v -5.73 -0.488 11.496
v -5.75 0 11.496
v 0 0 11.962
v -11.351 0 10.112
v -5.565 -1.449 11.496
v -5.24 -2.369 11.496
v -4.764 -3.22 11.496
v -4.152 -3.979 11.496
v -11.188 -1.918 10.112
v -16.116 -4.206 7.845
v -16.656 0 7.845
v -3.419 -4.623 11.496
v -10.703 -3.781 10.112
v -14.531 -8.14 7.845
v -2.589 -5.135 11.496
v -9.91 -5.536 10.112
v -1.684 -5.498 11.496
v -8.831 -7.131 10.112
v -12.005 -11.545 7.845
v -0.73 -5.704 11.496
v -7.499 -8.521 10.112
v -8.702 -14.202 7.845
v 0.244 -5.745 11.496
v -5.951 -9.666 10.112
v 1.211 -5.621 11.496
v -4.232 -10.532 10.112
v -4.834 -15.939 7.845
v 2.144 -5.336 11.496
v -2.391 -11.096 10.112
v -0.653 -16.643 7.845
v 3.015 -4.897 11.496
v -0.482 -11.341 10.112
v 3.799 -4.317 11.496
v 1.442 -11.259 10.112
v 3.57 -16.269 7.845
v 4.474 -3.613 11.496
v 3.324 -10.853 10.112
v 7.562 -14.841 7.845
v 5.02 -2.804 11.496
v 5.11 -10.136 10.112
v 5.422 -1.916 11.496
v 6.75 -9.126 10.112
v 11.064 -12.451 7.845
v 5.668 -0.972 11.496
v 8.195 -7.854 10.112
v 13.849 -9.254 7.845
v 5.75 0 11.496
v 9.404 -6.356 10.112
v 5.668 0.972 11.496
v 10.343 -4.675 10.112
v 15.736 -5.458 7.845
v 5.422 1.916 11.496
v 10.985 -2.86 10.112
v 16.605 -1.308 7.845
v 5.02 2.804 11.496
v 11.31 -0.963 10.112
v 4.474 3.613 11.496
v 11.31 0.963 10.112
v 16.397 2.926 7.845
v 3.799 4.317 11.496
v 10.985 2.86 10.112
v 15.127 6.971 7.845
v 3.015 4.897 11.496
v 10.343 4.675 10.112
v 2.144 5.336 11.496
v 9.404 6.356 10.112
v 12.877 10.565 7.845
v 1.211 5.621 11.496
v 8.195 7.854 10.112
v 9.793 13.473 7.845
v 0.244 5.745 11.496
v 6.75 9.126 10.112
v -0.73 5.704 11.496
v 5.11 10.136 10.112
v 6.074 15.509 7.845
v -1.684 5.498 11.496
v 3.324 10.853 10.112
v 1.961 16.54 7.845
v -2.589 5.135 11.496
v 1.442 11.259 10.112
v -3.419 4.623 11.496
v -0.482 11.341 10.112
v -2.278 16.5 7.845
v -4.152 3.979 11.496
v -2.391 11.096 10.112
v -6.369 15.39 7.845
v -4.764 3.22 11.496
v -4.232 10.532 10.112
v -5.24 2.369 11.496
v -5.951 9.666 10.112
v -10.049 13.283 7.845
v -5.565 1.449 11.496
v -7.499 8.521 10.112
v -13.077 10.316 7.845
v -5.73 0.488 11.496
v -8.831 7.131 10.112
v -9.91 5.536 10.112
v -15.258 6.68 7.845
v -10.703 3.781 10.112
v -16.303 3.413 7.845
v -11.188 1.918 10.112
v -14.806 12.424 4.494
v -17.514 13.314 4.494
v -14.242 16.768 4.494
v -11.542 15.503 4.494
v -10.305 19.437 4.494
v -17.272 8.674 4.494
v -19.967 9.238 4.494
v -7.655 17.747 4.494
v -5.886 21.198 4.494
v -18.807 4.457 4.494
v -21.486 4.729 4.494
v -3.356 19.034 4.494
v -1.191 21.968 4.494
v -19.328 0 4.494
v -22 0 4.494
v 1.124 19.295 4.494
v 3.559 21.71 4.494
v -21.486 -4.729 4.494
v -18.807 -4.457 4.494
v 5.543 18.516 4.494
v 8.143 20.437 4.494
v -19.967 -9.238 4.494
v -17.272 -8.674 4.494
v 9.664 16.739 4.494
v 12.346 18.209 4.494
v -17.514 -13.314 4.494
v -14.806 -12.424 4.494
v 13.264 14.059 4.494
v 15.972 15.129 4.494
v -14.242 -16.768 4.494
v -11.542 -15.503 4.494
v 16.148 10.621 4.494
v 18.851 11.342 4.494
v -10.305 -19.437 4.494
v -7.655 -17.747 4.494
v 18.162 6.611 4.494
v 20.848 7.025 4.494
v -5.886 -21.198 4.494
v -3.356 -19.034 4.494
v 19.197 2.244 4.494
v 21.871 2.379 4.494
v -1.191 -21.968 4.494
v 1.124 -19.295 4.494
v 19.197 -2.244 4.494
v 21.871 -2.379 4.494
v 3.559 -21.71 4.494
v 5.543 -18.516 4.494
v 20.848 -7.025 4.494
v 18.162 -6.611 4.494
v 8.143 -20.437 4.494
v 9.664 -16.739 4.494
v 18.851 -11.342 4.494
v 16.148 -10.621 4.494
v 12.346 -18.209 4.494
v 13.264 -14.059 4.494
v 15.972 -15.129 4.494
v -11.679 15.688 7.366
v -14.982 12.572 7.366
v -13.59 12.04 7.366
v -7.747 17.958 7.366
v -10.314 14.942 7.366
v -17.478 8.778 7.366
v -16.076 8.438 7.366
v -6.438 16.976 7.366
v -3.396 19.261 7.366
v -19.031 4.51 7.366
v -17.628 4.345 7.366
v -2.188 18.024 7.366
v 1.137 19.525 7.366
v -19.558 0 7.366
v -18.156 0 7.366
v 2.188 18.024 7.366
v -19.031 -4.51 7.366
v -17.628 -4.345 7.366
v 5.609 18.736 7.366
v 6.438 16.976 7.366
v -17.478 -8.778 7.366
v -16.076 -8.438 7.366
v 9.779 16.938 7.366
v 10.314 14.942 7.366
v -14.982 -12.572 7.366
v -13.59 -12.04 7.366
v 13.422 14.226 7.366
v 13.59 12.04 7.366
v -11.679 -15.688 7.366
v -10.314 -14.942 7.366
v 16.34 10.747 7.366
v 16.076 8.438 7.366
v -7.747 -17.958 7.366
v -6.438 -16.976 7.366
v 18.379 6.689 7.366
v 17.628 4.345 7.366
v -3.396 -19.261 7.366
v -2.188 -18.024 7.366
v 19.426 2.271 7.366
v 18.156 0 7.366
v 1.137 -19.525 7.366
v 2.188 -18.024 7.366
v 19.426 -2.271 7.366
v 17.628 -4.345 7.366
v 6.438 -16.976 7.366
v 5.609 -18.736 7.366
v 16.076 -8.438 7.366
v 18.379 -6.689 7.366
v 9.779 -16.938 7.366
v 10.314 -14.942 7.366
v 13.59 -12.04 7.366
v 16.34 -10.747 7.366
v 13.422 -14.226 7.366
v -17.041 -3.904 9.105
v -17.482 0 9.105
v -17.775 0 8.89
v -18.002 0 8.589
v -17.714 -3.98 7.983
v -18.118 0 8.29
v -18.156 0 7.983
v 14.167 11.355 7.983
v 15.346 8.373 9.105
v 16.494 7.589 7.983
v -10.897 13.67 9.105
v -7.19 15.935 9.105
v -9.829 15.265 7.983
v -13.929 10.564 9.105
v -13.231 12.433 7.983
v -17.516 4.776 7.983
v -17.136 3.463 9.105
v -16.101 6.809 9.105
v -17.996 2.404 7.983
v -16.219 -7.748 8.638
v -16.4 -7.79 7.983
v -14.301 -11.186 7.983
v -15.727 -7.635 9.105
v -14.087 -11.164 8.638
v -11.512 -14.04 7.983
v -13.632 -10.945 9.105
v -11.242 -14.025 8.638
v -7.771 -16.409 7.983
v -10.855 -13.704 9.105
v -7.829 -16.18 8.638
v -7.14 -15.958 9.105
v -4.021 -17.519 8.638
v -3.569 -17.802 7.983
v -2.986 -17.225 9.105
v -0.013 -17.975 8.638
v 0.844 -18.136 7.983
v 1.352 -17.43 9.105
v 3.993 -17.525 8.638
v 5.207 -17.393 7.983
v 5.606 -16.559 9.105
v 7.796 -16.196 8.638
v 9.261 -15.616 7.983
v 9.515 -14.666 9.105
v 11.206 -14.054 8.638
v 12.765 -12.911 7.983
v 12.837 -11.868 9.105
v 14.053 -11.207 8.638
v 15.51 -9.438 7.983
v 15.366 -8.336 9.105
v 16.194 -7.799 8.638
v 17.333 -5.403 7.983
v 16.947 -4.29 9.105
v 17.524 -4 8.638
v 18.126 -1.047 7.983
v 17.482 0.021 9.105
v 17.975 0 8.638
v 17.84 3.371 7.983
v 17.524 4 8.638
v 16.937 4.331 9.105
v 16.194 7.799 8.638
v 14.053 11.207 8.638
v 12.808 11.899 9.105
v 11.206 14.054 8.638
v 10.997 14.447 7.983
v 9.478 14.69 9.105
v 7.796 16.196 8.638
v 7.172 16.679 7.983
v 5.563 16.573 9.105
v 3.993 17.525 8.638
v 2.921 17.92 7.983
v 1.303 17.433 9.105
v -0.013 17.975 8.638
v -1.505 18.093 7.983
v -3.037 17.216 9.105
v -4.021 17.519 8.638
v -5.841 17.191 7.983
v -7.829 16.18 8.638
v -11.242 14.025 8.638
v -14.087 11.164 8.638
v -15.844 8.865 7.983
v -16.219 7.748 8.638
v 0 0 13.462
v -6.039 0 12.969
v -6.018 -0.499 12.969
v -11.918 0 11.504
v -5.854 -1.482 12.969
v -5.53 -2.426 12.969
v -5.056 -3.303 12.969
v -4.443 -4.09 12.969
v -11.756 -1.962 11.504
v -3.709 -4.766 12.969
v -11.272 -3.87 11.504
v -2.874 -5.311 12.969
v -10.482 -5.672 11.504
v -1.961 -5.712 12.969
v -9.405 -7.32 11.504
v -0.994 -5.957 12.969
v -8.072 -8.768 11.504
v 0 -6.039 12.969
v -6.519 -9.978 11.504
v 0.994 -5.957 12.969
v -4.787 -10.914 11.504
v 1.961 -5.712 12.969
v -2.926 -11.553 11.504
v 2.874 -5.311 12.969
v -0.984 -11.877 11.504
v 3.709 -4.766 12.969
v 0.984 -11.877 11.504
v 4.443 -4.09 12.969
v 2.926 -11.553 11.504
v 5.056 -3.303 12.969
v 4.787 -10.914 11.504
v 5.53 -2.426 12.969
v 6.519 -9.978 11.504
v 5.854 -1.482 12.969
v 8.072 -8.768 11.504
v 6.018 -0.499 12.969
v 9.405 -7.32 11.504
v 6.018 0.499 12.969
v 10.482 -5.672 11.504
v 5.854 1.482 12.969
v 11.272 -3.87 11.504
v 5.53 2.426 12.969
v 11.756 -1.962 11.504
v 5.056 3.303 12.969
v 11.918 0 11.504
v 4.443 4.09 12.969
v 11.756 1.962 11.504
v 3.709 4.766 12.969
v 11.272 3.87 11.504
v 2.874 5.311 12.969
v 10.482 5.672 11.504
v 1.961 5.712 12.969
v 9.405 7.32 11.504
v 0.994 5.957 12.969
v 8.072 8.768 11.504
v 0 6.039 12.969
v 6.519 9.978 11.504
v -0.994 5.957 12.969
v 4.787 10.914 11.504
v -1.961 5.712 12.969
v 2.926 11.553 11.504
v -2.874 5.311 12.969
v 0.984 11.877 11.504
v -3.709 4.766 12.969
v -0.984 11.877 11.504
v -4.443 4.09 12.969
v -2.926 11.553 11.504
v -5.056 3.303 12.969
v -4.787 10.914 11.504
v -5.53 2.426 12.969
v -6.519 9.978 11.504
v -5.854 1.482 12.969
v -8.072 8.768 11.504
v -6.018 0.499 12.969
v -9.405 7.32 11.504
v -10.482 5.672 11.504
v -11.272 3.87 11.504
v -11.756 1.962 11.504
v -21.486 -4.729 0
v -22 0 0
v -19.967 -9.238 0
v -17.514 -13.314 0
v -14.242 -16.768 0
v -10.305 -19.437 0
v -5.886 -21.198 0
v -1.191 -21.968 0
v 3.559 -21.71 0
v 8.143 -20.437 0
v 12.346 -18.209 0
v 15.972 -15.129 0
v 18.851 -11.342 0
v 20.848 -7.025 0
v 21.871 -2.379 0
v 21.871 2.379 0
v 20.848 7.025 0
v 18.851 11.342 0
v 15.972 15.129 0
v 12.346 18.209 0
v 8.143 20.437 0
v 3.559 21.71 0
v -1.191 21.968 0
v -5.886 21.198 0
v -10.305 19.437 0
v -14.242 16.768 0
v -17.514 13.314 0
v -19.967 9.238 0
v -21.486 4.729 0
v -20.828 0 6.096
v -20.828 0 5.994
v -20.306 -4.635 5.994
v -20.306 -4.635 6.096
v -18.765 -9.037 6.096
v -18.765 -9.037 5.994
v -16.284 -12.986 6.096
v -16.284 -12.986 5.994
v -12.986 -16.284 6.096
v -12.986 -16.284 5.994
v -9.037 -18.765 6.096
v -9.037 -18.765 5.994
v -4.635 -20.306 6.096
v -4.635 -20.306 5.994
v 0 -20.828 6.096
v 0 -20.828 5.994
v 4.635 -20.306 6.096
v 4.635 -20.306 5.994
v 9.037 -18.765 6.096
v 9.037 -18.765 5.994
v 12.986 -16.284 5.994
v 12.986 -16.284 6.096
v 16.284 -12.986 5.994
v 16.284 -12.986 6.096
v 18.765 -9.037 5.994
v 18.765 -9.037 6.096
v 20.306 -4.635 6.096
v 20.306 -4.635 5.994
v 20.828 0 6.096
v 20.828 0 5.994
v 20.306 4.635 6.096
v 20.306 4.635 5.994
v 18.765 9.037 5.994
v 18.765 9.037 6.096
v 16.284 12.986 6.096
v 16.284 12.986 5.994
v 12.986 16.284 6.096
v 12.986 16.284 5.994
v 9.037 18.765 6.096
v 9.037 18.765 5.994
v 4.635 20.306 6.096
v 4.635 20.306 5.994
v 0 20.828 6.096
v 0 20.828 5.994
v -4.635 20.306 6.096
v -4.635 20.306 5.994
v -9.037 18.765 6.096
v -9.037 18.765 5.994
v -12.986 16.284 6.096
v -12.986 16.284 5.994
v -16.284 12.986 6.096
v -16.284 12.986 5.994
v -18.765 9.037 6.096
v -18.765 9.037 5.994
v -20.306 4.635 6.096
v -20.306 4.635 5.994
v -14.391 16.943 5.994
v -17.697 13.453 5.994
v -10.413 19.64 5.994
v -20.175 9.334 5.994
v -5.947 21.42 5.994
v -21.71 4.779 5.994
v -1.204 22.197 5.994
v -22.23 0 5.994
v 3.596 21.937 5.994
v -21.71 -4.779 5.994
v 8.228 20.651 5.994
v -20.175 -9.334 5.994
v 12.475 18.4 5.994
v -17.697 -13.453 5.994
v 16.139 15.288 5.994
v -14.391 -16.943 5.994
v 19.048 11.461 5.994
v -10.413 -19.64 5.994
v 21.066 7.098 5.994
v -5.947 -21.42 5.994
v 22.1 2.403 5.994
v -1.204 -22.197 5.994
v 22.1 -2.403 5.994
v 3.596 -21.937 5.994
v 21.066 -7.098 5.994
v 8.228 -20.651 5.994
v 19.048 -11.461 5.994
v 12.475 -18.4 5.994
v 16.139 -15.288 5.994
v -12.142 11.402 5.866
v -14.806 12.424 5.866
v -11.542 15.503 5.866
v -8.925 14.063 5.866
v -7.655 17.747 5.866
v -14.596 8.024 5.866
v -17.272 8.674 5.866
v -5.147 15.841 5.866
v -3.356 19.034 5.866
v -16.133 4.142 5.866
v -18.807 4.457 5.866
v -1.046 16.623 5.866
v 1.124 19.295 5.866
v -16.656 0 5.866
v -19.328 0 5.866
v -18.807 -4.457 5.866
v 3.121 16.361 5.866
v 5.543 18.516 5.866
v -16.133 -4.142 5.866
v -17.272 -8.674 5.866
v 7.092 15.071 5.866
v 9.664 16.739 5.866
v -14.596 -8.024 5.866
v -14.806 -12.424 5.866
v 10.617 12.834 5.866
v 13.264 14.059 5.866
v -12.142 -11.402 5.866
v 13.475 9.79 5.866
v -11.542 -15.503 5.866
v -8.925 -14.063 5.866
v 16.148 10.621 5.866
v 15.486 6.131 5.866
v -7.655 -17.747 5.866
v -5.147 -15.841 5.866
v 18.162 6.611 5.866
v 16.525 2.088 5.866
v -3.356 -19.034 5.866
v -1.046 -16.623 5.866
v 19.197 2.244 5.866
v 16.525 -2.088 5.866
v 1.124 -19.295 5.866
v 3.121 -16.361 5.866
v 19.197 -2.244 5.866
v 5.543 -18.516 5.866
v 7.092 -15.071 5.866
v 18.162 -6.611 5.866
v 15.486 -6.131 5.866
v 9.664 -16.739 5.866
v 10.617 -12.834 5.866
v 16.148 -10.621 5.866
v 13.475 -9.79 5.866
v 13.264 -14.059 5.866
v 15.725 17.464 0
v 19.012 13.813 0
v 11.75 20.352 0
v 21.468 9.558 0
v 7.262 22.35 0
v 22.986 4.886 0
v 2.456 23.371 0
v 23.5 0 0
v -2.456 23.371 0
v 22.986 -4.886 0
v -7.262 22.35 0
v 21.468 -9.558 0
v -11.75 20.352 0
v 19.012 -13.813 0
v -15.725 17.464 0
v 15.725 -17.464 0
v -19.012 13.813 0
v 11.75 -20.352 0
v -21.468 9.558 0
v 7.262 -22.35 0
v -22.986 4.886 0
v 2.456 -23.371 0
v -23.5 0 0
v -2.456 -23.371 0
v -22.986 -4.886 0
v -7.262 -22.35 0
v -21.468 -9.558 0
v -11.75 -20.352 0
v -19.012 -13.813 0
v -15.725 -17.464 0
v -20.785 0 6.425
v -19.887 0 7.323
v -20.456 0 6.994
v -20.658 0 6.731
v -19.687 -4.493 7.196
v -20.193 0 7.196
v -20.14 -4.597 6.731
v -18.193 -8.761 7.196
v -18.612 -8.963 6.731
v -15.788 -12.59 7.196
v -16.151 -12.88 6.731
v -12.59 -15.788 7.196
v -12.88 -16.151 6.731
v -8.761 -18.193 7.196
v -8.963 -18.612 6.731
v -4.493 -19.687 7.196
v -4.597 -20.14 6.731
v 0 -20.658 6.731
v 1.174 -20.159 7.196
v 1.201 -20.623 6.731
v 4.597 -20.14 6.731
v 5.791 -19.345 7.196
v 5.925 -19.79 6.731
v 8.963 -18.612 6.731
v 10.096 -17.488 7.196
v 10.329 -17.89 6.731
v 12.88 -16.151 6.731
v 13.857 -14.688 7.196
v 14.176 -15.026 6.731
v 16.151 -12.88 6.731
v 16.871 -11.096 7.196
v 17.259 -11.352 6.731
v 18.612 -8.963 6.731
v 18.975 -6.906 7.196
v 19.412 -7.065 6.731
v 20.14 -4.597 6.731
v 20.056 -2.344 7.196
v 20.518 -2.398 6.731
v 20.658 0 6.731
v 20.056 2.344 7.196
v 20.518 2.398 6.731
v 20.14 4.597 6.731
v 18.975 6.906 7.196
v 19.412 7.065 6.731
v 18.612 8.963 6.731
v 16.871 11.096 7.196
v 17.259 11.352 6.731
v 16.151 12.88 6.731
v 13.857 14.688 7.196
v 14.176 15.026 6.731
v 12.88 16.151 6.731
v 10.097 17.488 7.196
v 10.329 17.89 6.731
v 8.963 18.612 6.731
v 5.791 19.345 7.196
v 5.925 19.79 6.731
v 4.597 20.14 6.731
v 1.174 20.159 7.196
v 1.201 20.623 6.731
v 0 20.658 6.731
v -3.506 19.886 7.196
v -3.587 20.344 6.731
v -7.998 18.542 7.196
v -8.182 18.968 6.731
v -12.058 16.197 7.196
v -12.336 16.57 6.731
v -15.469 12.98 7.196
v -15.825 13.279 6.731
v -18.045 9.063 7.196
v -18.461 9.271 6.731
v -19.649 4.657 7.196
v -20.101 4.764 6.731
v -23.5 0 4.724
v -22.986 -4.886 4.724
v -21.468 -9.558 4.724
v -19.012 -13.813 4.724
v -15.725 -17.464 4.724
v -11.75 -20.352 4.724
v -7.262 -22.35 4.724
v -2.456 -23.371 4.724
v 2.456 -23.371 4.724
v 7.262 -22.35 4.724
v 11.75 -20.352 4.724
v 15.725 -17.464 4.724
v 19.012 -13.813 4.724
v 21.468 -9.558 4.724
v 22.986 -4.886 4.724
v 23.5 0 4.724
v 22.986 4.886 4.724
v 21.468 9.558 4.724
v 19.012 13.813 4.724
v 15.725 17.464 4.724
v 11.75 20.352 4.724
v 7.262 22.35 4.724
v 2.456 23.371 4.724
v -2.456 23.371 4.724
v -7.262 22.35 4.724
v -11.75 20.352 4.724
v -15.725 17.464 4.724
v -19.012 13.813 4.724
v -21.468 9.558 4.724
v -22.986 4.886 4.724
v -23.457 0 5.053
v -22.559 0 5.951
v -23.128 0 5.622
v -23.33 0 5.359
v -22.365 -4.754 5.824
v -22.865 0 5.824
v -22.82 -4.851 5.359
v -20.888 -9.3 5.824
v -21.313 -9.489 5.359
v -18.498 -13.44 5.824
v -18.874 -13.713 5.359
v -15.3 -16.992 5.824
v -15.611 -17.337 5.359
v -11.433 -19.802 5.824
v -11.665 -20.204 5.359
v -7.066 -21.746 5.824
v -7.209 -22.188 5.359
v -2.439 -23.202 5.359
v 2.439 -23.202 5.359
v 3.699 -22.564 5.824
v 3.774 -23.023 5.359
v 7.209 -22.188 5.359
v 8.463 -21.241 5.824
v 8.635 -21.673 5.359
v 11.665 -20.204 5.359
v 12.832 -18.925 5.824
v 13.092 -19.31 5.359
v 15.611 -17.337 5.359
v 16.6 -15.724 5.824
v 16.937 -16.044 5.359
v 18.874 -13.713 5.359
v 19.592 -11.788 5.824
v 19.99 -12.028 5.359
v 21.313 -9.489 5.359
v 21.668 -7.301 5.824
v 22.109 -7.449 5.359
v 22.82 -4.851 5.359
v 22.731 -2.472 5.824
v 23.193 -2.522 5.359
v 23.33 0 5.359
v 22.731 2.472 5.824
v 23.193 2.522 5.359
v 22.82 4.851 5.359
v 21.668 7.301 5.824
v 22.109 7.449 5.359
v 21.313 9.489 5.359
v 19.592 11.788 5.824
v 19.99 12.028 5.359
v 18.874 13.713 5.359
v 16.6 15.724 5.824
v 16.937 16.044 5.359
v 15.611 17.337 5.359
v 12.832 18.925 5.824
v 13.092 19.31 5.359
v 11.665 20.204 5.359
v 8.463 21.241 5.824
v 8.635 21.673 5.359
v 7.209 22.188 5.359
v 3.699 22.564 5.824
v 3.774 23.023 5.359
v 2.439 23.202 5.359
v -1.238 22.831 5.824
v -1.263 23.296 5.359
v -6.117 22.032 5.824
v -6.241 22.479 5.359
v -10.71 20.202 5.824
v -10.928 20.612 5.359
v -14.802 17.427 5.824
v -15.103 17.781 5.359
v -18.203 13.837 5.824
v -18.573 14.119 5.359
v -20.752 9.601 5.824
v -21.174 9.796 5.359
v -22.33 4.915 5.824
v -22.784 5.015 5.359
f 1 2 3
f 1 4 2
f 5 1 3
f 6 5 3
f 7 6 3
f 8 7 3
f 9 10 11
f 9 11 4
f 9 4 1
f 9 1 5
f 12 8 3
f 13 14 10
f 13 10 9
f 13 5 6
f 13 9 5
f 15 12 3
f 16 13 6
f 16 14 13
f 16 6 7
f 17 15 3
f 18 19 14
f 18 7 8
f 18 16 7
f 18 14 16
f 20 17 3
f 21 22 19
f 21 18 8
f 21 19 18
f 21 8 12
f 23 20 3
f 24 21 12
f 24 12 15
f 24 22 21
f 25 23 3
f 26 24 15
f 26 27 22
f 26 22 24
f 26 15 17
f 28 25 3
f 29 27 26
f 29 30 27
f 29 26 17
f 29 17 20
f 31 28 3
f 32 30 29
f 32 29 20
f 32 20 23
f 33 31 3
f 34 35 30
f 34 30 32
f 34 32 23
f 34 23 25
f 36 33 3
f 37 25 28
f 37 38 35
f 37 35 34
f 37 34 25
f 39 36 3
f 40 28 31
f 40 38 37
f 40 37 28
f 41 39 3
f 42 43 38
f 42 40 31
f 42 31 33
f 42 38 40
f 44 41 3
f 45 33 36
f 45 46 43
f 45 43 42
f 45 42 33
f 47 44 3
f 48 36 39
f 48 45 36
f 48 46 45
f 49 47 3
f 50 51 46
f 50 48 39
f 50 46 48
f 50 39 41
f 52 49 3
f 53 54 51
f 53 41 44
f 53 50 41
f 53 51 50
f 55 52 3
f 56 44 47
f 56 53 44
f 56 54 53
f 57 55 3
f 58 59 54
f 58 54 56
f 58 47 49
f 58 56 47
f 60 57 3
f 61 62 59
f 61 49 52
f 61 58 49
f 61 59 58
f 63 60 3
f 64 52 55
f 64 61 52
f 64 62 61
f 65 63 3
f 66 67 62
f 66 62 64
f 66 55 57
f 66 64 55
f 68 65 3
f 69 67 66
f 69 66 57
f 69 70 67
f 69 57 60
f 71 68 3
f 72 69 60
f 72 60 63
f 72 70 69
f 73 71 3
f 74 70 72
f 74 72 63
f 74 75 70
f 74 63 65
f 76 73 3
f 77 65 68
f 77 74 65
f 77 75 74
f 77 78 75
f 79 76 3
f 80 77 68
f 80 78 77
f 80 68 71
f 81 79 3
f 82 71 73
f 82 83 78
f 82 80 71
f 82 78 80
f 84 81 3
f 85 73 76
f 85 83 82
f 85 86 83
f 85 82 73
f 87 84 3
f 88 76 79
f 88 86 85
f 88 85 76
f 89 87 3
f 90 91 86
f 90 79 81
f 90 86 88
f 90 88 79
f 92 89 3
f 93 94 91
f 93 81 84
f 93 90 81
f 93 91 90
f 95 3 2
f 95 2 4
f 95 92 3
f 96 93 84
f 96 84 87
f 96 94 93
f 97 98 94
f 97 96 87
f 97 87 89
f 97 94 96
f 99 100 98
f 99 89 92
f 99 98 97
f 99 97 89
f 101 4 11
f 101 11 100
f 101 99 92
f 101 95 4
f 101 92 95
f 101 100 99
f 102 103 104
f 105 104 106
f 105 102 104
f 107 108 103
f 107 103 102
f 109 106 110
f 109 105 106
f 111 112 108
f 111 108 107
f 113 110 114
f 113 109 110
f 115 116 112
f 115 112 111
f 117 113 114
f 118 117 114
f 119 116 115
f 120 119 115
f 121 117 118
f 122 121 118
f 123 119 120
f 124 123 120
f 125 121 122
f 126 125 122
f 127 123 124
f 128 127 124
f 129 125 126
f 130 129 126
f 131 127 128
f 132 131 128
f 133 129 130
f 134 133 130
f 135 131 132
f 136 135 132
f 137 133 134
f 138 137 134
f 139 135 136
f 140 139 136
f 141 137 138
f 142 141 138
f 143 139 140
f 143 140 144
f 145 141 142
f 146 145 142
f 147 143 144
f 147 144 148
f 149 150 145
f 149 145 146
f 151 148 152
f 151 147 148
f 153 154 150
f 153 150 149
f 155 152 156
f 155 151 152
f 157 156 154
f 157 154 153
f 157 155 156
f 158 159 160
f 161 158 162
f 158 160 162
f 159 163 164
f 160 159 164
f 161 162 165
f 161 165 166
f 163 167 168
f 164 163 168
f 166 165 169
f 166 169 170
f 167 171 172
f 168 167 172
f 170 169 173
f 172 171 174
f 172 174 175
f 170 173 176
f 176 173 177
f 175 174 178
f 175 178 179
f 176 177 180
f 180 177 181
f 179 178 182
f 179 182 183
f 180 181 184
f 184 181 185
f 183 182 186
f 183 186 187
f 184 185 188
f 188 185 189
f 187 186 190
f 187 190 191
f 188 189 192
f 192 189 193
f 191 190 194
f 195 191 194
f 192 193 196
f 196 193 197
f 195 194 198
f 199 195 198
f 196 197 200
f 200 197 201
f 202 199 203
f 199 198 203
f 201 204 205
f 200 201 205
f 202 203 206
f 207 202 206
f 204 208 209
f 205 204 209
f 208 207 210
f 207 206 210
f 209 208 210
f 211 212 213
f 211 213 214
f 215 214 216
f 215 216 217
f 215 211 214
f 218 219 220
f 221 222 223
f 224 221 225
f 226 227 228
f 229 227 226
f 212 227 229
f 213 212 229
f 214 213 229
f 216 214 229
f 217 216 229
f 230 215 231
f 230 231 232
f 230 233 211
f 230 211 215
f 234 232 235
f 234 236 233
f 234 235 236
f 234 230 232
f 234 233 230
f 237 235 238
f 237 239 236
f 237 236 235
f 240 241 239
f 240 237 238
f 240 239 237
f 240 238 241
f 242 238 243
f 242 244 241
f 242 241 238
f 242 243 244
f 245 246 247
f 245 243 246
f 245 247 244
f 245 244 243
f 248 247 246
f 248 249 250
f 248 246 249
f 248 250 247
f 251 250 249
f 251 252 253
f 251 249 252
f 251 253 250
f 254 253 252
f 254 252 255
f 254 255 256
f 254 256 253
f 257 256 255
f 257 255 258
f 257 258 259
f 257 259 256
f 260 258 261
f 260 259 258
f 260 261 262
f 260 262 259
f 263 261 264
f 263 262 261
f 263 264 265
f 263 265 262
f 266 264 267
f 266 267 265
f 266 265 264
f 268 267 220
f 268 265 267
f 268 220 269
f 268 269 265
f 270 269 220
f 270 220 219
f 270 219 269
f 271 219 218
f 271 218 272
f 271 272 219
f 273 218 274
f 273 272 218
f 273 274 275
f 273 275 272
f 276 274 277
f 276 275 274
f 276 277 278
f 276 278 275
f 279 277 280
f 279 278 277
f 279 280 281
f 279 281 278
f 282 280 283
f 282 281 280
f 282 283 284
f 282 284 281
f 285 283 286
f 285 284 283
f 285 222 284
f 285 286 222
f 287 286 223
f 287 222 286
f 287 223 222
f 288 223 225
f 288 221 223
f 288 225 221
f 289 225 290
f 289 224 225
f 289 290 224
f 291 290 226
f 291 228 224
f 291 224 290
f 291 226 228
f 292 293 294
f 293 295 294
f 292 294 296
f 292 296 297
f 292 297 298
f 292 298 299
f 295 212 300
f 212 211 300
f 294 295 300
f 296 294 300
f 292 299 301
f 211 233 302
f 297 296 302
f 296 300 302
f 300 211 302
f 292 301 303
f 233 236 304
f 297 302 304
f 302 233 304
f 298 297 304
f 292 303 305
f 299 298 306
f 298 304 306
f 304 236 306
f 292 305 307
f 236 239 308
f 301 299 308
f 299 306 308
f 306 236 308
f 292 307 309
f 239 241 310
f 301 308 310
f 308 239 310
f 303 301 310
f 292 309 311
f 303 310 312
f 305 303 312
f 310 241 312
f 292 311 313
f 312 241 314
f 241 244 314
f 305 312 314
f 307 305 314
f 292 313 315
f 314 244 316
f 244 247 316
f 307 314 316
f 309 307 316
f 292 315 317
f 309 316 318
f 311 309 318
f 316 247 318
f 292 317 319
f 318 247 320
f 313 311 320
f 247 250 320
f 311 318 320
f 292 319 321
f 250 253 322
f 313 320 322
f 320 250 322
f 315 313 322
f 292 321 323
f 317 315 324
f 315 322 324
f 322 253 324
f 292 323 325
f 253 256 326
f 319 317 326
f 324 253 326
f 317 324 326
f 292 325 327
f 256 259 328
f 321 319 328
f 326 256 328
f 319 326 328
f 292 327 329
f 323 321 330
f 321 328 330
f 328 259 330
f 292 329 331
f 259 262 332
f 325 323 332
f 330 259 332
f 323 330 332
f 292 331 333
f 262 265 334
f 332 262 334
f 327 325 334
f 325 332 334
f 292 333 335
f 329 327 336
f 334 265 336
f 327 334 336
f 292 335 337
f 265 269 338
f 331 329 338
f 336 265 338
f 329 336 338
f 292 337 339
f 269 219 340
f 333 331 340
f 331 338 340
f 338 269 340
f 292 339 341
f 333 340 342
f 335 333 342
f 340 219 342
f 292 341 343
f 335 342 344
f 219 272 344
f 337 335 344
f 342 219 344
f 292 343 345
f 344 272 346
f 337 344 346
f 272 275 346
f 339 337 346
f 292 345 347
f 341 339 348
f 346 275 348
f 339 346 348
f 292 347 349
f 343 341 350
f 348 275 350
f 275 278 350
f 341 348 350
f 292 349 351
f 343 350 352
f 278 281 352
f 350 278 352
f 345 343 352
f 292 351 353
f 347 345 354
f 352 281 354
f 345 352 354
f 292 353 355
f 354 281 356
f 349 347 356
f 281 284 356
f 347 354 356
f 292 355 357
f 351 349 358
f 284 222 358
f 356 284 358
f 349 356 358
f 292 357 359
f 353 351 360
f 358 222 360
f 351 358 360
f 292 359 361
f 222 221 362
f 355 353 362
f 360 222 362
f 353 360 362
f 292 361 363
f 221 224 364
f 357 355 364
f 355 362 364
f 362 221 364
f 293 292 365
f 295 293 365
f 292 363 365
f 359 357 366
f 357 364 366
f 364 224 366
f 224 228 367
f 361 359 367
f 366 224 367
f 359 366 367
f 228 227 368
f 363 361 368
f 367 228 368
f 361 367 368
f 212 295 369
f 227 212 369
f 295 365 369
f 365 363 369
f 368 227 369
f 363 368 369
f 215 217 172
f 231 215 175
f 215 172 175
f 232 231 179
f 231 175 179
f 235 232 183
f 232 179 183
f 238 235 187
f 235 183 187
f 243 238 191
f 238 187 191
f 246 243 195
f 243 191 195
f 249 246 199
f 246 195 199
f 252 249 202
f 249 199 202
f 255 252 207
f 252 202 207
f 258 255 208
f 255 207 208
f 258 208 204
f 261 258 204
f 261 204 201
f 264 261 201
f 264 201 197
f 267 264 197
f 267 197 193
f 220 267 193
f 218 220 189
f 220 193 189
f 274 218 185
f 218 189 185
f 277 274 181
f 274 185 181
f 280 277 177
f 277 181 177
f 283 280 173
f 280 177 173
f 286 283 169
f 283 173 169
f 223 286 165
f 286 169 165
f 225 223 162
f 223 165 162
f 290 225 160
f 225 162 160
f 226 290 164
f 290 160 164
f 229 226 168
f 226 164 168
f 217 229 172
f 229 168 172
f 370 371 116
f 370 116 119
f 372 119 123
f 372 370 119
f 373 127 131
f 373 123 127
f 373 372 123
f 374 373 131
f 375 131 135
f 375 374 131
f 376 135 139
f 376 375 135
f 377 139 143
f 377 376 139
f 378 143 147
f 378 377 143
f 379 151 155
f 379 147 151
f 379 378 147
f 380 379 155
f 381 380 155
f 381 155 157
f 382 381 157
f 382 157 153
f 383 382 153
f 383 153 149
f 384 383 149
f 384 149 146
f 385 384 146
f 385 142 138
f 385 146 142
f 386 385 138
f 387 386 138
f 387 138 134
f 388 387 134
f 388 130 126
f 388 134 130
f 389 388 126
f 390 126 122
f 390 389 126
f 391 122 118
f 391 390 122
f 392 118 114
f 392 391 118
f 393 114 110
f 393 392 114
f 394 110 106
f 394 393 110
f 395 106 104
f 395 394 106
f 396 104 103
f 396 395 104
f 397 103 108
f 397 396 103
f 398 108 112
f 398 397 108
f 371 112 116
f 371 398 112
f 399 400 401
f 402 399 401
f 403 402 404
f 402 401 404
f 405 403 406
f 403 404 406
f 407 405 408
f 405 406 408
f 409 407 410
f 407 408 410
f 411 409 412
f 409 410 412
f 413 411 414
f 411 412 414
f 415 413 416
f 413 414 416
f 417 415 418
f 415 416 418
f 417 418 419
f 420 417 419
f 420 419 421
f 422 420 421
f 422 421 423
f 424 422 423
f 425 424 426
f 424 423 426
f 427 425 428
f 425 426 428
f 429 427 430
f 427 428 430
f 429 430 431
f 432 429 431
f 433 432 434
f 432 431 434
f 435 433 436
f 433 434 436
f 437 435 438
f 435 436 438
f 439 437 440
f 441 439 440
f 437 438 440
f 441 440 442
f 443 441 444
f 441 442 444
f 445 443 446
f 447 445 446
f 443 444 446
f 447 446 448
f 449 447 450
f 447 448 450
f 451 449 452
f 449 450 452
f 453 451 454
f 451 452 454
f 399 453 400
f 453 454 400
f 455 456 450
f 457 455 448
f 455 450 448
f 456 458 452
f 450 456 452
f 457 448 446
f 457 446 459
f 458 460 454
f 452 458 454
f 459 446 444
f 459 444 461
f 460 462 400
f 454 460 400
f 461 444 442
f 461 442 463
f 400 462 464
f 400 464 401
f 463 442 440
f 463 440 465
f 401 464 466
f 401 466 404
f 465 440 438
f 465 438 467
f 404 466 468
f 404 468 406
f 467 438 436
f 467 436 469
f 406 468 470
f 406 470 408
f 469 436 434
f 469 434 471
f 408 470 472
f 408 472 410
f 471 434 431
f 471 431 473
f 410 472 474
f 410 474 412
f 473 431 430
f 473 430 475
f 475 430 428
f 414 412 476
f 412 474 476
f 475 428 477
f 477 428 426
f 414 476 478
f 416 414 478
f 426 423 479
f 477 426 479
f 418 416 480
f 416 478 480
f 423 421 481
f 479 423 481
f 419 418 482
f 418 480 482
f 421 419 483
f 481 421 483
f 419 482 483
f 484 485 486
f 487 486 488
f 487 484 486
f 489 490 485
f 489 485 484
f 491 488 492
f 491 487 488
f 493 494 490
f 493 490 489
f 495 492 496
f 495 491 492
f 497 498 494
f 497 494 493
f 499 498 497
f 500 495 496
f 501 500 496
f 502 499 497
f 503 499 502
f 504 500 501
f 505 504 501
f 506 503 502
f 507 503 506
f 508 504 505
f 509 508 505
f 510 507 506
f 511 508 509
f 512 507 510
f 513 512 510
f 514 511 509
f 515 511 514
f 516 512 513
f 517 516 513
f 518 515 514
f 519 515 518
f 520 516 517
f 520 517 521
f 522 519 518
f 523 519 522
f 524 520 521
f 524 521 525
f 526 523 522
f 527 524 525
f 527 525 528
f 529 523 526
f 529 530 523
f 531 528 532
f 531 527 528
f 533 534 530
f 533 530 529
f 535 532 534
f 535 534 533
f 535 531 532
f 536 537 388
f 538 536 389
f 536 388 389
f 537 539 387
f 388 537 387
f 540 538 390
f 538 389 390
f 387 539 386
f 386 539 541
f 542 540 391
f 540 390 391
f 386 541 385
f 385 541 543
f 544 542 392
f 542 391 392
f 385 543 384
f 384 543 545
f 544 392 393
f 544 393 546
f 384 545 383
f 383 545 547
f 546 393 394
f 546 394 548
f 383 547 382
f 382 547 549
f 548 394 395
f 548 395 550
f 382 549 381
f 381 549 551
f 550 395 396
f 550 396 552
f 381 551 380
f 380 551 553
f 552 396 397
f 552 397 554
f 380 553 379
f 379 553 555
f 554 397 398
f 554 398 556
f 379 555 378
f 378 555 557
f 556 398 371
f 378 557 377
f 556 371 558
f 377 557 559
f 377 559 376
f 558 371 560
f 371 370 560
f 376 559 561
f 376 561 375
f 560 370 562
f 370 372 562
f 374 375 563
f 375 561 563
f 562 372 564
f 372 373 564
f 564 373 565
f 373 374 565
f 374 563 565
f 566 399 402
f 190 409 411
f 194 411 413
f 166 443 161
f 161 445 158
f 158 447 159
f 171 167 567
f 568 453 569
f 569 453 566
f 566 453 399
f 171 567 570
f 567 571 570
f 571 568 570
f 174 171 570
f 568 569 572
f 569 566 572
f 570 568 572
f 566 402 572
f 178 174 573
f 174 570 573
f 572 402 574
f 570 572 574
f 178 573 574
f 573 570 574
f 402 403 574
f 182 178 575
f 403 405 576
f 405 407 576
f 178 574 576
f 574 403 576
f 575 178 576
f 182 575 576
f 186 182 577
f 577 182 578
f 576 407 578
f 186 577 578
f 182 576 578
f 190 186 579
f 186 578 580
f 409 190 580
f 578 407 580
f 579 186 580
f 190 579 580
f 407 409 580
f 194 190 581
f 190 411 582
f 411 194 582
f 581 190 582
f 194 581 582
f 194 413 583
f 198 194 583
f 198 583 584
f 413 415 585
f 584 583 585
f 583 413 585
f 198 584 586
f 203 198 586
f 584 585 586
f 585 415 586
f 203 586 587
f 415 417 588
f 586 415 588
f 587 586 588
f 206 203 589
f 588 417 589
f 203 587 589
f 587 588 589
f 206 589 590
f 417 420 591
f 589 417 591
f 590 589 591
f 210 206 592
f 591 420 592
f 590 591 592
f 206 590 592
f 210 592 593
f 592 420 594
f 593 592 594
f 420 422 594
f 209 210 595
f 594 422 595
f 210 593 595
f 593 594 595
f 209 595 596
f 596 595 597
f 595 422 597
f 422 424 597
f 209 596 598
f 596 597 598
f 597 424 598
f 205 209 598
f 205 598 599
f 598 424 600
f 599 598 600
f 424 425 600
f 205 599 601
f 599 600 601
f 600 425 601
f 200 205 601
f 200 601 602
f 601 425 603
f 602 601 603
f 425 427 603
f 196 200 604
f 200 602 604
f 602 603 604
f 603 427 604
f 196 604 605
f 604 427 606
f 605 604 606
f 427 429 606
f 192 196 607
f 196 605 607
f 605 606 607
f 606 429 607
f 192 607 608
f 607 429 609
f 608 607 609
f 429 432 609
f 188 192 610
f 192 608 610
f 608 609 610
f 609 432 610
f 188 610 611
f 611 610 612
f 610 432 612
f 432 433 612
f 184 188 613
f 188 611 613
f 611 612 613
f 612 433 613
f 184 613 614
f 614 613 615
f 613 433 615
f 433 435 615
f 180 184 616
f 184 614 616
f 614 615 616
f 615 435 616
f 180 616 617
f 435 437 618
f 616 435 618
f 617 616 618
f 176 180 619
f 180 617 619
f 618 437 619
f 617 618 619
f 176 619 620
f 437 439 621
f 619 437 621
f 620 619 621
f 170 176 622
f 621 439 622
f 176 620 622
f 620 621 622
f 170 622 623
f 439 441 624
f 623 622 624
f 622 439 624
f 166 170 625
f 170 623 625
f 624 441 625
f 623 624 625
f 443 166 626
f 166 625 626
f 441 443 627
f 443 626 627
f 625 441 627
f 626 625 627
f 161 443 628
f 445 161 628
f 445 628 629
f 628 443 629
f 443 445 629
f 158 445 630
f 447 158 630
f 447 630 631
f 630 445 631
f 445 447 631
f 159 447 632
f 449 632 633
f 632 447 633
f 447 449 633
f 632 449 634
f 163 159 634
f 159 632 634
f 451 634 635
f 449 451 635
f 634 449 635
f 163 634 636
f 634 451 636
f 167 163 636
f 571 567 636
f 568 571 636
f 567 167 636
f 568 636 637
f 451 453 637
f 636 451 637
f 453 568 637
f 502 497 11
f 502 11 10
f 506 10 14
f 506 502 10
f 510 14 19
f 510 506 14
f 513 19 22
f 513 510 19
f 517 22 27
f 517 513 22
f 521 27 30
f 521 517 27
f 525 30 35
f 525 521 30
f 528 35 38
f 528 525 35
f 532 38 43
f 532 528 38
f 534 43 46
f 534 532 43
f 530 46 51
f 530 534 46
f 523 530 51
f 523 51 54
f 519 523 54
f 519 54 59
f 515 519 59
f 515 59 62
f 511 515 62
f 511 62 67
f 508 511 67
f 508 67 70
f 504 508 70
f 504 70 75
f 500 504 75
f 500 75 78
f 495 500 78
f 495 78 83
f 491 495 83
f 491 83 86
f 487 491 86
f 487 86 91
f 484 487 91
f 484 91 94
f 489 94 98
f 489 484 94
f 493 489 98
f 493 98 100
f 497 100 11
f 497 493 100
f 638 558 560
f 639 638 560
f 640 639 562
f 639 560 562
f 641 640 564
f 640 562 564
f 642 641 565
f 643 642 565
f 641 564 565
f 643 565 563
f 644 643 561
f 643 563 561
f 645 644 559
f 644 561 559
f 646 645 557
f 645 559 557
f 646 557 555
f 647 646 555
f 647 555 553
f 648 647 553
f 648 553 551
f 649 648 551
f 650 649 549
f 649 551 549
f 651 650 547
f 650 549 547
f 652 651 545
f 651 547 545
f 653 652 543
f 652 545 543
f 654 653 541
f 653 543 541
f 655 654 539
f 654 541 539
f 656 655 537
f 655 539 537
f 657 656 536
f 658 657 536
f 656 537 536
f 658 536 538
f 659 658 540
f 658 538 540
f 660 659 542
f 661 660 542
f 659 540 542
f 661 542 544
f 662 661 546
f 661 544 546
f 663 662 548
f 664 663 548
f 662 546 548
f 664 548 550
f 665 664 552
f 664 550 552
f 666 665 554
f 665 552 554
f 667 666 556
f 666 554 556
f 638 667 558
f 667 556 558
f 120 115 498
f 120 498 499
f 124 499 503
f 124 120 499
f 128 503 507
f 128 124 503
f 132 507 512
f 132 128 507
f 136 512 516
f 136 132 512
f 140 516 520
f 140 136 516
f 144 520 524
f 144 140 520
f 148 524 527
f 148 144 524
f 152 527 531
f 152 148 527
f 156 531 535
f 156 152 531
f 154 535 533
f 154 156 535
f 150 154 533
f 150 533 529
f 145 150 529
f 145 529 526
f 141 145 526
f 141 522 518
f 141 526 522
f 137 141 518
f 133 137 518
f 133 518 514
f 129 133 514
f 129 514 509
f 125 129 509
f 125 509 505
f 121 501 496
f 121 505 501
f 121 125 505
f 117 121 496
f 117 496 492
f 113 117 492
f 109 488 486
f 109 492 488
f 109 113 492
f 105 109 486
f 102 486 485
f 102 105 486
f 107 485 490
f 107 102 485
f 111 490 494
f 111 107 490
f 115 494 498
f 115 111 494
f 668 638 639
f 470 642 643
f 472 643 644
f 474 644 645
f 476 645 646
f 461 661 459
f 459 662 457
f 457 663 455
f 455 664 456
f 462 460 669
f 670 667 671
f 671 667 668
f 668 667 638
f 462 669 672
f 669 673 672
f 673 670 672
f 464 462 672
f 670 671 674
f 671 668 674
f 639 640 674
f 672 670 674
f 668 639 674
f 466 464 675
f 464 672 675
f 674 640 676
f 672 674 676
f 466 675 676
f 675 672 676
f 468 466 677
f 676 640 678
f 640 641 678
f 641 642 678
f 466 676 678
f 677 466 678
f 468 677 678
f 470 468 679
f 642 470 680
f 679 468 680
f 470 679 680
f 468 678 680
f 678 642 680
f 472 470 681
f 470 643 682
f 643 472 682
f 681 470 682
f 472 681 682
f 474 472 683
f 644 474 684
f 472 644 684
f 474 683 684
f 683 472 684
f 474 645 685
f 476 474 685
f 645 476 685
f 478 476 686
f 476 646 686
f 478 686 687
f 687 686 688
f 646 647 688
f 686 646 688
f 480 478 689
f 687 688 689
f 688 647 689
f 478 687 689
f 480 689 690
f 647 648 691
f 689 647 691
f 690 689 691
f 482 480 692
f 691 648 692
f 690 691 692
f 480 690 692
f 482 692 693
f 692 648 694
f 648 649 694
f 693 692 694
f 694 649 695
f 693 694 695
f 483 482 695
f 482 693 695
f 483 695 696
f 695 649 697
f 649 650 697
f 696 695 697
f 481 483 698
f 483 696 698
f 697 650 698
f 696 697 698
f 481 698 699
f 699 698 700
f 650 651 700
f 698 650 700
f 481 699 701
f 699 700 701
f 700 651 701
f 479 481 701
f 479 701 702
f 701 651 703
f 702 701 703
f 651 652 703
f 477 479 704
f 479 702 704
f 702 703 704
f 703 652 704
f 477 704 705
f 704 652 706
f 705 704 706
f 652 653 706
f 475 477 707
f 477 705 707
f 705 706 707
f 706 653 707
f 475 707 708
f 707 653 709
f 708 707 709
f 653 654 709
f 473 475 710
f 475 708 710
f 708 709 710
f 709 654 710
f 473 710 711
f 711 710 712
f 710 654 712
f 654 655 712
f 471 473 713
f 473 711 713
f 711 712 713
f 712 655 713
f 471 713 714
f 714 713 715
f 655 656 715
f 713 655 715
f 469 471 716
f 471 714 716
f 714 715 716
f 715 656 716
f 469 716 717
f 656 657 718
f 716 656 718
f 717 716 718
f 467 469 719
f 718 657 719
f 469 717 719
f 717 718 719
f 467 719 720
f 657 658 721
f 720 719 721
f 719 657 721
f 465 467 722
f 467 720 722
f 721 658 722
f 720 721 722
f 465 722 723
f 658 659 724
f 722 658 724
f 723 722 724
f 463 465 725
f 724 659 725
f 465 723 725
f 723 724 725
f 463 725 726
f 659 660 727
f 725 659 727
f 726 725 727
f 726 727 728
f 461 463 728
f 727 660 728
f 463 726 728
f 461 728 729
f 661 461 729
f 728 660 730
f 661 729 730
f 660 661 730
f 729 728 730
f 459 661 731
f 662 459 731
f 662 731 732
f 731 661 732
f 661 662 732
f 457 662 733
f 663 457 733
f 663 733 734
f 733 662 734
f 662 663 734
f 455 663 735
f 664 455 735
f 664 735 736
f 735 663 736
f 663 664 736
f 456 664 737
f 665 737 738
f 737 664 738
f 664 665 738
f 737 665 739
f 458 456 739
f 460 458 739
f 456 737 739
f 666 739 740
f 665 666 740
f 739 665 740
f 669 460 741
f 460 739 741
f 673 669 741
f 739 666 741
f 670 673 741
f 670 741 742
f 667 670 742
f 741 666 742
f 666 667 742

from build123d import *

# Parameters (mm, degrees)
F2_R = 1.27
F3_T = -1.5


with BuildPart() as f1:
    # F0 (on Front) → F1 (revolve)
    with BuildSketch(Plane.XZ):
        Polygon((-23.5, 0), (0, 0), (0, 5.9944), (-20.828, 5.9944), (-23.5, 5.9944), align=None)
        Polygon((-20.828, 5.9944), (0, 5.9944), (0, 7.366), (-18.1559962, 7.366), (-20.828, 7.366), align=None)
        with BuildLine():
            Line((-18.1559962, 7.366), (0, 7.366))
            Line((0, 7.366), (0, 13.462))
            ThreePointArc((0, 13.462), (-9.3803005465, 12.2615564285), (-18.1559962, 8.7376))
            Line((-18.1559962, 8.7376), (-18.1559962, 7.366))
        make_face()
    revolve(axis=Axis((0, 0, 6.731), (0, 0, 1)))

    # F2
    f2_edges = [f1.edges().sort_by_distance(p)[0] for p in [
        (20.828, 0, 7.366),
        (18.155996, 0, 8.7376),
        (23.5, 0, 5.9944),
    ]]
    fillet(f2_edges, radius=F2_R)

    # F3
    f3_openings = [f1.faces().sort_by_distance(p)[0] for p in [
        (0, 0, 0),
    ]]
    offset(amount=F3_T, openings=f3_openings, kind=Kind.INTERSECTION)


solid = f1.part
